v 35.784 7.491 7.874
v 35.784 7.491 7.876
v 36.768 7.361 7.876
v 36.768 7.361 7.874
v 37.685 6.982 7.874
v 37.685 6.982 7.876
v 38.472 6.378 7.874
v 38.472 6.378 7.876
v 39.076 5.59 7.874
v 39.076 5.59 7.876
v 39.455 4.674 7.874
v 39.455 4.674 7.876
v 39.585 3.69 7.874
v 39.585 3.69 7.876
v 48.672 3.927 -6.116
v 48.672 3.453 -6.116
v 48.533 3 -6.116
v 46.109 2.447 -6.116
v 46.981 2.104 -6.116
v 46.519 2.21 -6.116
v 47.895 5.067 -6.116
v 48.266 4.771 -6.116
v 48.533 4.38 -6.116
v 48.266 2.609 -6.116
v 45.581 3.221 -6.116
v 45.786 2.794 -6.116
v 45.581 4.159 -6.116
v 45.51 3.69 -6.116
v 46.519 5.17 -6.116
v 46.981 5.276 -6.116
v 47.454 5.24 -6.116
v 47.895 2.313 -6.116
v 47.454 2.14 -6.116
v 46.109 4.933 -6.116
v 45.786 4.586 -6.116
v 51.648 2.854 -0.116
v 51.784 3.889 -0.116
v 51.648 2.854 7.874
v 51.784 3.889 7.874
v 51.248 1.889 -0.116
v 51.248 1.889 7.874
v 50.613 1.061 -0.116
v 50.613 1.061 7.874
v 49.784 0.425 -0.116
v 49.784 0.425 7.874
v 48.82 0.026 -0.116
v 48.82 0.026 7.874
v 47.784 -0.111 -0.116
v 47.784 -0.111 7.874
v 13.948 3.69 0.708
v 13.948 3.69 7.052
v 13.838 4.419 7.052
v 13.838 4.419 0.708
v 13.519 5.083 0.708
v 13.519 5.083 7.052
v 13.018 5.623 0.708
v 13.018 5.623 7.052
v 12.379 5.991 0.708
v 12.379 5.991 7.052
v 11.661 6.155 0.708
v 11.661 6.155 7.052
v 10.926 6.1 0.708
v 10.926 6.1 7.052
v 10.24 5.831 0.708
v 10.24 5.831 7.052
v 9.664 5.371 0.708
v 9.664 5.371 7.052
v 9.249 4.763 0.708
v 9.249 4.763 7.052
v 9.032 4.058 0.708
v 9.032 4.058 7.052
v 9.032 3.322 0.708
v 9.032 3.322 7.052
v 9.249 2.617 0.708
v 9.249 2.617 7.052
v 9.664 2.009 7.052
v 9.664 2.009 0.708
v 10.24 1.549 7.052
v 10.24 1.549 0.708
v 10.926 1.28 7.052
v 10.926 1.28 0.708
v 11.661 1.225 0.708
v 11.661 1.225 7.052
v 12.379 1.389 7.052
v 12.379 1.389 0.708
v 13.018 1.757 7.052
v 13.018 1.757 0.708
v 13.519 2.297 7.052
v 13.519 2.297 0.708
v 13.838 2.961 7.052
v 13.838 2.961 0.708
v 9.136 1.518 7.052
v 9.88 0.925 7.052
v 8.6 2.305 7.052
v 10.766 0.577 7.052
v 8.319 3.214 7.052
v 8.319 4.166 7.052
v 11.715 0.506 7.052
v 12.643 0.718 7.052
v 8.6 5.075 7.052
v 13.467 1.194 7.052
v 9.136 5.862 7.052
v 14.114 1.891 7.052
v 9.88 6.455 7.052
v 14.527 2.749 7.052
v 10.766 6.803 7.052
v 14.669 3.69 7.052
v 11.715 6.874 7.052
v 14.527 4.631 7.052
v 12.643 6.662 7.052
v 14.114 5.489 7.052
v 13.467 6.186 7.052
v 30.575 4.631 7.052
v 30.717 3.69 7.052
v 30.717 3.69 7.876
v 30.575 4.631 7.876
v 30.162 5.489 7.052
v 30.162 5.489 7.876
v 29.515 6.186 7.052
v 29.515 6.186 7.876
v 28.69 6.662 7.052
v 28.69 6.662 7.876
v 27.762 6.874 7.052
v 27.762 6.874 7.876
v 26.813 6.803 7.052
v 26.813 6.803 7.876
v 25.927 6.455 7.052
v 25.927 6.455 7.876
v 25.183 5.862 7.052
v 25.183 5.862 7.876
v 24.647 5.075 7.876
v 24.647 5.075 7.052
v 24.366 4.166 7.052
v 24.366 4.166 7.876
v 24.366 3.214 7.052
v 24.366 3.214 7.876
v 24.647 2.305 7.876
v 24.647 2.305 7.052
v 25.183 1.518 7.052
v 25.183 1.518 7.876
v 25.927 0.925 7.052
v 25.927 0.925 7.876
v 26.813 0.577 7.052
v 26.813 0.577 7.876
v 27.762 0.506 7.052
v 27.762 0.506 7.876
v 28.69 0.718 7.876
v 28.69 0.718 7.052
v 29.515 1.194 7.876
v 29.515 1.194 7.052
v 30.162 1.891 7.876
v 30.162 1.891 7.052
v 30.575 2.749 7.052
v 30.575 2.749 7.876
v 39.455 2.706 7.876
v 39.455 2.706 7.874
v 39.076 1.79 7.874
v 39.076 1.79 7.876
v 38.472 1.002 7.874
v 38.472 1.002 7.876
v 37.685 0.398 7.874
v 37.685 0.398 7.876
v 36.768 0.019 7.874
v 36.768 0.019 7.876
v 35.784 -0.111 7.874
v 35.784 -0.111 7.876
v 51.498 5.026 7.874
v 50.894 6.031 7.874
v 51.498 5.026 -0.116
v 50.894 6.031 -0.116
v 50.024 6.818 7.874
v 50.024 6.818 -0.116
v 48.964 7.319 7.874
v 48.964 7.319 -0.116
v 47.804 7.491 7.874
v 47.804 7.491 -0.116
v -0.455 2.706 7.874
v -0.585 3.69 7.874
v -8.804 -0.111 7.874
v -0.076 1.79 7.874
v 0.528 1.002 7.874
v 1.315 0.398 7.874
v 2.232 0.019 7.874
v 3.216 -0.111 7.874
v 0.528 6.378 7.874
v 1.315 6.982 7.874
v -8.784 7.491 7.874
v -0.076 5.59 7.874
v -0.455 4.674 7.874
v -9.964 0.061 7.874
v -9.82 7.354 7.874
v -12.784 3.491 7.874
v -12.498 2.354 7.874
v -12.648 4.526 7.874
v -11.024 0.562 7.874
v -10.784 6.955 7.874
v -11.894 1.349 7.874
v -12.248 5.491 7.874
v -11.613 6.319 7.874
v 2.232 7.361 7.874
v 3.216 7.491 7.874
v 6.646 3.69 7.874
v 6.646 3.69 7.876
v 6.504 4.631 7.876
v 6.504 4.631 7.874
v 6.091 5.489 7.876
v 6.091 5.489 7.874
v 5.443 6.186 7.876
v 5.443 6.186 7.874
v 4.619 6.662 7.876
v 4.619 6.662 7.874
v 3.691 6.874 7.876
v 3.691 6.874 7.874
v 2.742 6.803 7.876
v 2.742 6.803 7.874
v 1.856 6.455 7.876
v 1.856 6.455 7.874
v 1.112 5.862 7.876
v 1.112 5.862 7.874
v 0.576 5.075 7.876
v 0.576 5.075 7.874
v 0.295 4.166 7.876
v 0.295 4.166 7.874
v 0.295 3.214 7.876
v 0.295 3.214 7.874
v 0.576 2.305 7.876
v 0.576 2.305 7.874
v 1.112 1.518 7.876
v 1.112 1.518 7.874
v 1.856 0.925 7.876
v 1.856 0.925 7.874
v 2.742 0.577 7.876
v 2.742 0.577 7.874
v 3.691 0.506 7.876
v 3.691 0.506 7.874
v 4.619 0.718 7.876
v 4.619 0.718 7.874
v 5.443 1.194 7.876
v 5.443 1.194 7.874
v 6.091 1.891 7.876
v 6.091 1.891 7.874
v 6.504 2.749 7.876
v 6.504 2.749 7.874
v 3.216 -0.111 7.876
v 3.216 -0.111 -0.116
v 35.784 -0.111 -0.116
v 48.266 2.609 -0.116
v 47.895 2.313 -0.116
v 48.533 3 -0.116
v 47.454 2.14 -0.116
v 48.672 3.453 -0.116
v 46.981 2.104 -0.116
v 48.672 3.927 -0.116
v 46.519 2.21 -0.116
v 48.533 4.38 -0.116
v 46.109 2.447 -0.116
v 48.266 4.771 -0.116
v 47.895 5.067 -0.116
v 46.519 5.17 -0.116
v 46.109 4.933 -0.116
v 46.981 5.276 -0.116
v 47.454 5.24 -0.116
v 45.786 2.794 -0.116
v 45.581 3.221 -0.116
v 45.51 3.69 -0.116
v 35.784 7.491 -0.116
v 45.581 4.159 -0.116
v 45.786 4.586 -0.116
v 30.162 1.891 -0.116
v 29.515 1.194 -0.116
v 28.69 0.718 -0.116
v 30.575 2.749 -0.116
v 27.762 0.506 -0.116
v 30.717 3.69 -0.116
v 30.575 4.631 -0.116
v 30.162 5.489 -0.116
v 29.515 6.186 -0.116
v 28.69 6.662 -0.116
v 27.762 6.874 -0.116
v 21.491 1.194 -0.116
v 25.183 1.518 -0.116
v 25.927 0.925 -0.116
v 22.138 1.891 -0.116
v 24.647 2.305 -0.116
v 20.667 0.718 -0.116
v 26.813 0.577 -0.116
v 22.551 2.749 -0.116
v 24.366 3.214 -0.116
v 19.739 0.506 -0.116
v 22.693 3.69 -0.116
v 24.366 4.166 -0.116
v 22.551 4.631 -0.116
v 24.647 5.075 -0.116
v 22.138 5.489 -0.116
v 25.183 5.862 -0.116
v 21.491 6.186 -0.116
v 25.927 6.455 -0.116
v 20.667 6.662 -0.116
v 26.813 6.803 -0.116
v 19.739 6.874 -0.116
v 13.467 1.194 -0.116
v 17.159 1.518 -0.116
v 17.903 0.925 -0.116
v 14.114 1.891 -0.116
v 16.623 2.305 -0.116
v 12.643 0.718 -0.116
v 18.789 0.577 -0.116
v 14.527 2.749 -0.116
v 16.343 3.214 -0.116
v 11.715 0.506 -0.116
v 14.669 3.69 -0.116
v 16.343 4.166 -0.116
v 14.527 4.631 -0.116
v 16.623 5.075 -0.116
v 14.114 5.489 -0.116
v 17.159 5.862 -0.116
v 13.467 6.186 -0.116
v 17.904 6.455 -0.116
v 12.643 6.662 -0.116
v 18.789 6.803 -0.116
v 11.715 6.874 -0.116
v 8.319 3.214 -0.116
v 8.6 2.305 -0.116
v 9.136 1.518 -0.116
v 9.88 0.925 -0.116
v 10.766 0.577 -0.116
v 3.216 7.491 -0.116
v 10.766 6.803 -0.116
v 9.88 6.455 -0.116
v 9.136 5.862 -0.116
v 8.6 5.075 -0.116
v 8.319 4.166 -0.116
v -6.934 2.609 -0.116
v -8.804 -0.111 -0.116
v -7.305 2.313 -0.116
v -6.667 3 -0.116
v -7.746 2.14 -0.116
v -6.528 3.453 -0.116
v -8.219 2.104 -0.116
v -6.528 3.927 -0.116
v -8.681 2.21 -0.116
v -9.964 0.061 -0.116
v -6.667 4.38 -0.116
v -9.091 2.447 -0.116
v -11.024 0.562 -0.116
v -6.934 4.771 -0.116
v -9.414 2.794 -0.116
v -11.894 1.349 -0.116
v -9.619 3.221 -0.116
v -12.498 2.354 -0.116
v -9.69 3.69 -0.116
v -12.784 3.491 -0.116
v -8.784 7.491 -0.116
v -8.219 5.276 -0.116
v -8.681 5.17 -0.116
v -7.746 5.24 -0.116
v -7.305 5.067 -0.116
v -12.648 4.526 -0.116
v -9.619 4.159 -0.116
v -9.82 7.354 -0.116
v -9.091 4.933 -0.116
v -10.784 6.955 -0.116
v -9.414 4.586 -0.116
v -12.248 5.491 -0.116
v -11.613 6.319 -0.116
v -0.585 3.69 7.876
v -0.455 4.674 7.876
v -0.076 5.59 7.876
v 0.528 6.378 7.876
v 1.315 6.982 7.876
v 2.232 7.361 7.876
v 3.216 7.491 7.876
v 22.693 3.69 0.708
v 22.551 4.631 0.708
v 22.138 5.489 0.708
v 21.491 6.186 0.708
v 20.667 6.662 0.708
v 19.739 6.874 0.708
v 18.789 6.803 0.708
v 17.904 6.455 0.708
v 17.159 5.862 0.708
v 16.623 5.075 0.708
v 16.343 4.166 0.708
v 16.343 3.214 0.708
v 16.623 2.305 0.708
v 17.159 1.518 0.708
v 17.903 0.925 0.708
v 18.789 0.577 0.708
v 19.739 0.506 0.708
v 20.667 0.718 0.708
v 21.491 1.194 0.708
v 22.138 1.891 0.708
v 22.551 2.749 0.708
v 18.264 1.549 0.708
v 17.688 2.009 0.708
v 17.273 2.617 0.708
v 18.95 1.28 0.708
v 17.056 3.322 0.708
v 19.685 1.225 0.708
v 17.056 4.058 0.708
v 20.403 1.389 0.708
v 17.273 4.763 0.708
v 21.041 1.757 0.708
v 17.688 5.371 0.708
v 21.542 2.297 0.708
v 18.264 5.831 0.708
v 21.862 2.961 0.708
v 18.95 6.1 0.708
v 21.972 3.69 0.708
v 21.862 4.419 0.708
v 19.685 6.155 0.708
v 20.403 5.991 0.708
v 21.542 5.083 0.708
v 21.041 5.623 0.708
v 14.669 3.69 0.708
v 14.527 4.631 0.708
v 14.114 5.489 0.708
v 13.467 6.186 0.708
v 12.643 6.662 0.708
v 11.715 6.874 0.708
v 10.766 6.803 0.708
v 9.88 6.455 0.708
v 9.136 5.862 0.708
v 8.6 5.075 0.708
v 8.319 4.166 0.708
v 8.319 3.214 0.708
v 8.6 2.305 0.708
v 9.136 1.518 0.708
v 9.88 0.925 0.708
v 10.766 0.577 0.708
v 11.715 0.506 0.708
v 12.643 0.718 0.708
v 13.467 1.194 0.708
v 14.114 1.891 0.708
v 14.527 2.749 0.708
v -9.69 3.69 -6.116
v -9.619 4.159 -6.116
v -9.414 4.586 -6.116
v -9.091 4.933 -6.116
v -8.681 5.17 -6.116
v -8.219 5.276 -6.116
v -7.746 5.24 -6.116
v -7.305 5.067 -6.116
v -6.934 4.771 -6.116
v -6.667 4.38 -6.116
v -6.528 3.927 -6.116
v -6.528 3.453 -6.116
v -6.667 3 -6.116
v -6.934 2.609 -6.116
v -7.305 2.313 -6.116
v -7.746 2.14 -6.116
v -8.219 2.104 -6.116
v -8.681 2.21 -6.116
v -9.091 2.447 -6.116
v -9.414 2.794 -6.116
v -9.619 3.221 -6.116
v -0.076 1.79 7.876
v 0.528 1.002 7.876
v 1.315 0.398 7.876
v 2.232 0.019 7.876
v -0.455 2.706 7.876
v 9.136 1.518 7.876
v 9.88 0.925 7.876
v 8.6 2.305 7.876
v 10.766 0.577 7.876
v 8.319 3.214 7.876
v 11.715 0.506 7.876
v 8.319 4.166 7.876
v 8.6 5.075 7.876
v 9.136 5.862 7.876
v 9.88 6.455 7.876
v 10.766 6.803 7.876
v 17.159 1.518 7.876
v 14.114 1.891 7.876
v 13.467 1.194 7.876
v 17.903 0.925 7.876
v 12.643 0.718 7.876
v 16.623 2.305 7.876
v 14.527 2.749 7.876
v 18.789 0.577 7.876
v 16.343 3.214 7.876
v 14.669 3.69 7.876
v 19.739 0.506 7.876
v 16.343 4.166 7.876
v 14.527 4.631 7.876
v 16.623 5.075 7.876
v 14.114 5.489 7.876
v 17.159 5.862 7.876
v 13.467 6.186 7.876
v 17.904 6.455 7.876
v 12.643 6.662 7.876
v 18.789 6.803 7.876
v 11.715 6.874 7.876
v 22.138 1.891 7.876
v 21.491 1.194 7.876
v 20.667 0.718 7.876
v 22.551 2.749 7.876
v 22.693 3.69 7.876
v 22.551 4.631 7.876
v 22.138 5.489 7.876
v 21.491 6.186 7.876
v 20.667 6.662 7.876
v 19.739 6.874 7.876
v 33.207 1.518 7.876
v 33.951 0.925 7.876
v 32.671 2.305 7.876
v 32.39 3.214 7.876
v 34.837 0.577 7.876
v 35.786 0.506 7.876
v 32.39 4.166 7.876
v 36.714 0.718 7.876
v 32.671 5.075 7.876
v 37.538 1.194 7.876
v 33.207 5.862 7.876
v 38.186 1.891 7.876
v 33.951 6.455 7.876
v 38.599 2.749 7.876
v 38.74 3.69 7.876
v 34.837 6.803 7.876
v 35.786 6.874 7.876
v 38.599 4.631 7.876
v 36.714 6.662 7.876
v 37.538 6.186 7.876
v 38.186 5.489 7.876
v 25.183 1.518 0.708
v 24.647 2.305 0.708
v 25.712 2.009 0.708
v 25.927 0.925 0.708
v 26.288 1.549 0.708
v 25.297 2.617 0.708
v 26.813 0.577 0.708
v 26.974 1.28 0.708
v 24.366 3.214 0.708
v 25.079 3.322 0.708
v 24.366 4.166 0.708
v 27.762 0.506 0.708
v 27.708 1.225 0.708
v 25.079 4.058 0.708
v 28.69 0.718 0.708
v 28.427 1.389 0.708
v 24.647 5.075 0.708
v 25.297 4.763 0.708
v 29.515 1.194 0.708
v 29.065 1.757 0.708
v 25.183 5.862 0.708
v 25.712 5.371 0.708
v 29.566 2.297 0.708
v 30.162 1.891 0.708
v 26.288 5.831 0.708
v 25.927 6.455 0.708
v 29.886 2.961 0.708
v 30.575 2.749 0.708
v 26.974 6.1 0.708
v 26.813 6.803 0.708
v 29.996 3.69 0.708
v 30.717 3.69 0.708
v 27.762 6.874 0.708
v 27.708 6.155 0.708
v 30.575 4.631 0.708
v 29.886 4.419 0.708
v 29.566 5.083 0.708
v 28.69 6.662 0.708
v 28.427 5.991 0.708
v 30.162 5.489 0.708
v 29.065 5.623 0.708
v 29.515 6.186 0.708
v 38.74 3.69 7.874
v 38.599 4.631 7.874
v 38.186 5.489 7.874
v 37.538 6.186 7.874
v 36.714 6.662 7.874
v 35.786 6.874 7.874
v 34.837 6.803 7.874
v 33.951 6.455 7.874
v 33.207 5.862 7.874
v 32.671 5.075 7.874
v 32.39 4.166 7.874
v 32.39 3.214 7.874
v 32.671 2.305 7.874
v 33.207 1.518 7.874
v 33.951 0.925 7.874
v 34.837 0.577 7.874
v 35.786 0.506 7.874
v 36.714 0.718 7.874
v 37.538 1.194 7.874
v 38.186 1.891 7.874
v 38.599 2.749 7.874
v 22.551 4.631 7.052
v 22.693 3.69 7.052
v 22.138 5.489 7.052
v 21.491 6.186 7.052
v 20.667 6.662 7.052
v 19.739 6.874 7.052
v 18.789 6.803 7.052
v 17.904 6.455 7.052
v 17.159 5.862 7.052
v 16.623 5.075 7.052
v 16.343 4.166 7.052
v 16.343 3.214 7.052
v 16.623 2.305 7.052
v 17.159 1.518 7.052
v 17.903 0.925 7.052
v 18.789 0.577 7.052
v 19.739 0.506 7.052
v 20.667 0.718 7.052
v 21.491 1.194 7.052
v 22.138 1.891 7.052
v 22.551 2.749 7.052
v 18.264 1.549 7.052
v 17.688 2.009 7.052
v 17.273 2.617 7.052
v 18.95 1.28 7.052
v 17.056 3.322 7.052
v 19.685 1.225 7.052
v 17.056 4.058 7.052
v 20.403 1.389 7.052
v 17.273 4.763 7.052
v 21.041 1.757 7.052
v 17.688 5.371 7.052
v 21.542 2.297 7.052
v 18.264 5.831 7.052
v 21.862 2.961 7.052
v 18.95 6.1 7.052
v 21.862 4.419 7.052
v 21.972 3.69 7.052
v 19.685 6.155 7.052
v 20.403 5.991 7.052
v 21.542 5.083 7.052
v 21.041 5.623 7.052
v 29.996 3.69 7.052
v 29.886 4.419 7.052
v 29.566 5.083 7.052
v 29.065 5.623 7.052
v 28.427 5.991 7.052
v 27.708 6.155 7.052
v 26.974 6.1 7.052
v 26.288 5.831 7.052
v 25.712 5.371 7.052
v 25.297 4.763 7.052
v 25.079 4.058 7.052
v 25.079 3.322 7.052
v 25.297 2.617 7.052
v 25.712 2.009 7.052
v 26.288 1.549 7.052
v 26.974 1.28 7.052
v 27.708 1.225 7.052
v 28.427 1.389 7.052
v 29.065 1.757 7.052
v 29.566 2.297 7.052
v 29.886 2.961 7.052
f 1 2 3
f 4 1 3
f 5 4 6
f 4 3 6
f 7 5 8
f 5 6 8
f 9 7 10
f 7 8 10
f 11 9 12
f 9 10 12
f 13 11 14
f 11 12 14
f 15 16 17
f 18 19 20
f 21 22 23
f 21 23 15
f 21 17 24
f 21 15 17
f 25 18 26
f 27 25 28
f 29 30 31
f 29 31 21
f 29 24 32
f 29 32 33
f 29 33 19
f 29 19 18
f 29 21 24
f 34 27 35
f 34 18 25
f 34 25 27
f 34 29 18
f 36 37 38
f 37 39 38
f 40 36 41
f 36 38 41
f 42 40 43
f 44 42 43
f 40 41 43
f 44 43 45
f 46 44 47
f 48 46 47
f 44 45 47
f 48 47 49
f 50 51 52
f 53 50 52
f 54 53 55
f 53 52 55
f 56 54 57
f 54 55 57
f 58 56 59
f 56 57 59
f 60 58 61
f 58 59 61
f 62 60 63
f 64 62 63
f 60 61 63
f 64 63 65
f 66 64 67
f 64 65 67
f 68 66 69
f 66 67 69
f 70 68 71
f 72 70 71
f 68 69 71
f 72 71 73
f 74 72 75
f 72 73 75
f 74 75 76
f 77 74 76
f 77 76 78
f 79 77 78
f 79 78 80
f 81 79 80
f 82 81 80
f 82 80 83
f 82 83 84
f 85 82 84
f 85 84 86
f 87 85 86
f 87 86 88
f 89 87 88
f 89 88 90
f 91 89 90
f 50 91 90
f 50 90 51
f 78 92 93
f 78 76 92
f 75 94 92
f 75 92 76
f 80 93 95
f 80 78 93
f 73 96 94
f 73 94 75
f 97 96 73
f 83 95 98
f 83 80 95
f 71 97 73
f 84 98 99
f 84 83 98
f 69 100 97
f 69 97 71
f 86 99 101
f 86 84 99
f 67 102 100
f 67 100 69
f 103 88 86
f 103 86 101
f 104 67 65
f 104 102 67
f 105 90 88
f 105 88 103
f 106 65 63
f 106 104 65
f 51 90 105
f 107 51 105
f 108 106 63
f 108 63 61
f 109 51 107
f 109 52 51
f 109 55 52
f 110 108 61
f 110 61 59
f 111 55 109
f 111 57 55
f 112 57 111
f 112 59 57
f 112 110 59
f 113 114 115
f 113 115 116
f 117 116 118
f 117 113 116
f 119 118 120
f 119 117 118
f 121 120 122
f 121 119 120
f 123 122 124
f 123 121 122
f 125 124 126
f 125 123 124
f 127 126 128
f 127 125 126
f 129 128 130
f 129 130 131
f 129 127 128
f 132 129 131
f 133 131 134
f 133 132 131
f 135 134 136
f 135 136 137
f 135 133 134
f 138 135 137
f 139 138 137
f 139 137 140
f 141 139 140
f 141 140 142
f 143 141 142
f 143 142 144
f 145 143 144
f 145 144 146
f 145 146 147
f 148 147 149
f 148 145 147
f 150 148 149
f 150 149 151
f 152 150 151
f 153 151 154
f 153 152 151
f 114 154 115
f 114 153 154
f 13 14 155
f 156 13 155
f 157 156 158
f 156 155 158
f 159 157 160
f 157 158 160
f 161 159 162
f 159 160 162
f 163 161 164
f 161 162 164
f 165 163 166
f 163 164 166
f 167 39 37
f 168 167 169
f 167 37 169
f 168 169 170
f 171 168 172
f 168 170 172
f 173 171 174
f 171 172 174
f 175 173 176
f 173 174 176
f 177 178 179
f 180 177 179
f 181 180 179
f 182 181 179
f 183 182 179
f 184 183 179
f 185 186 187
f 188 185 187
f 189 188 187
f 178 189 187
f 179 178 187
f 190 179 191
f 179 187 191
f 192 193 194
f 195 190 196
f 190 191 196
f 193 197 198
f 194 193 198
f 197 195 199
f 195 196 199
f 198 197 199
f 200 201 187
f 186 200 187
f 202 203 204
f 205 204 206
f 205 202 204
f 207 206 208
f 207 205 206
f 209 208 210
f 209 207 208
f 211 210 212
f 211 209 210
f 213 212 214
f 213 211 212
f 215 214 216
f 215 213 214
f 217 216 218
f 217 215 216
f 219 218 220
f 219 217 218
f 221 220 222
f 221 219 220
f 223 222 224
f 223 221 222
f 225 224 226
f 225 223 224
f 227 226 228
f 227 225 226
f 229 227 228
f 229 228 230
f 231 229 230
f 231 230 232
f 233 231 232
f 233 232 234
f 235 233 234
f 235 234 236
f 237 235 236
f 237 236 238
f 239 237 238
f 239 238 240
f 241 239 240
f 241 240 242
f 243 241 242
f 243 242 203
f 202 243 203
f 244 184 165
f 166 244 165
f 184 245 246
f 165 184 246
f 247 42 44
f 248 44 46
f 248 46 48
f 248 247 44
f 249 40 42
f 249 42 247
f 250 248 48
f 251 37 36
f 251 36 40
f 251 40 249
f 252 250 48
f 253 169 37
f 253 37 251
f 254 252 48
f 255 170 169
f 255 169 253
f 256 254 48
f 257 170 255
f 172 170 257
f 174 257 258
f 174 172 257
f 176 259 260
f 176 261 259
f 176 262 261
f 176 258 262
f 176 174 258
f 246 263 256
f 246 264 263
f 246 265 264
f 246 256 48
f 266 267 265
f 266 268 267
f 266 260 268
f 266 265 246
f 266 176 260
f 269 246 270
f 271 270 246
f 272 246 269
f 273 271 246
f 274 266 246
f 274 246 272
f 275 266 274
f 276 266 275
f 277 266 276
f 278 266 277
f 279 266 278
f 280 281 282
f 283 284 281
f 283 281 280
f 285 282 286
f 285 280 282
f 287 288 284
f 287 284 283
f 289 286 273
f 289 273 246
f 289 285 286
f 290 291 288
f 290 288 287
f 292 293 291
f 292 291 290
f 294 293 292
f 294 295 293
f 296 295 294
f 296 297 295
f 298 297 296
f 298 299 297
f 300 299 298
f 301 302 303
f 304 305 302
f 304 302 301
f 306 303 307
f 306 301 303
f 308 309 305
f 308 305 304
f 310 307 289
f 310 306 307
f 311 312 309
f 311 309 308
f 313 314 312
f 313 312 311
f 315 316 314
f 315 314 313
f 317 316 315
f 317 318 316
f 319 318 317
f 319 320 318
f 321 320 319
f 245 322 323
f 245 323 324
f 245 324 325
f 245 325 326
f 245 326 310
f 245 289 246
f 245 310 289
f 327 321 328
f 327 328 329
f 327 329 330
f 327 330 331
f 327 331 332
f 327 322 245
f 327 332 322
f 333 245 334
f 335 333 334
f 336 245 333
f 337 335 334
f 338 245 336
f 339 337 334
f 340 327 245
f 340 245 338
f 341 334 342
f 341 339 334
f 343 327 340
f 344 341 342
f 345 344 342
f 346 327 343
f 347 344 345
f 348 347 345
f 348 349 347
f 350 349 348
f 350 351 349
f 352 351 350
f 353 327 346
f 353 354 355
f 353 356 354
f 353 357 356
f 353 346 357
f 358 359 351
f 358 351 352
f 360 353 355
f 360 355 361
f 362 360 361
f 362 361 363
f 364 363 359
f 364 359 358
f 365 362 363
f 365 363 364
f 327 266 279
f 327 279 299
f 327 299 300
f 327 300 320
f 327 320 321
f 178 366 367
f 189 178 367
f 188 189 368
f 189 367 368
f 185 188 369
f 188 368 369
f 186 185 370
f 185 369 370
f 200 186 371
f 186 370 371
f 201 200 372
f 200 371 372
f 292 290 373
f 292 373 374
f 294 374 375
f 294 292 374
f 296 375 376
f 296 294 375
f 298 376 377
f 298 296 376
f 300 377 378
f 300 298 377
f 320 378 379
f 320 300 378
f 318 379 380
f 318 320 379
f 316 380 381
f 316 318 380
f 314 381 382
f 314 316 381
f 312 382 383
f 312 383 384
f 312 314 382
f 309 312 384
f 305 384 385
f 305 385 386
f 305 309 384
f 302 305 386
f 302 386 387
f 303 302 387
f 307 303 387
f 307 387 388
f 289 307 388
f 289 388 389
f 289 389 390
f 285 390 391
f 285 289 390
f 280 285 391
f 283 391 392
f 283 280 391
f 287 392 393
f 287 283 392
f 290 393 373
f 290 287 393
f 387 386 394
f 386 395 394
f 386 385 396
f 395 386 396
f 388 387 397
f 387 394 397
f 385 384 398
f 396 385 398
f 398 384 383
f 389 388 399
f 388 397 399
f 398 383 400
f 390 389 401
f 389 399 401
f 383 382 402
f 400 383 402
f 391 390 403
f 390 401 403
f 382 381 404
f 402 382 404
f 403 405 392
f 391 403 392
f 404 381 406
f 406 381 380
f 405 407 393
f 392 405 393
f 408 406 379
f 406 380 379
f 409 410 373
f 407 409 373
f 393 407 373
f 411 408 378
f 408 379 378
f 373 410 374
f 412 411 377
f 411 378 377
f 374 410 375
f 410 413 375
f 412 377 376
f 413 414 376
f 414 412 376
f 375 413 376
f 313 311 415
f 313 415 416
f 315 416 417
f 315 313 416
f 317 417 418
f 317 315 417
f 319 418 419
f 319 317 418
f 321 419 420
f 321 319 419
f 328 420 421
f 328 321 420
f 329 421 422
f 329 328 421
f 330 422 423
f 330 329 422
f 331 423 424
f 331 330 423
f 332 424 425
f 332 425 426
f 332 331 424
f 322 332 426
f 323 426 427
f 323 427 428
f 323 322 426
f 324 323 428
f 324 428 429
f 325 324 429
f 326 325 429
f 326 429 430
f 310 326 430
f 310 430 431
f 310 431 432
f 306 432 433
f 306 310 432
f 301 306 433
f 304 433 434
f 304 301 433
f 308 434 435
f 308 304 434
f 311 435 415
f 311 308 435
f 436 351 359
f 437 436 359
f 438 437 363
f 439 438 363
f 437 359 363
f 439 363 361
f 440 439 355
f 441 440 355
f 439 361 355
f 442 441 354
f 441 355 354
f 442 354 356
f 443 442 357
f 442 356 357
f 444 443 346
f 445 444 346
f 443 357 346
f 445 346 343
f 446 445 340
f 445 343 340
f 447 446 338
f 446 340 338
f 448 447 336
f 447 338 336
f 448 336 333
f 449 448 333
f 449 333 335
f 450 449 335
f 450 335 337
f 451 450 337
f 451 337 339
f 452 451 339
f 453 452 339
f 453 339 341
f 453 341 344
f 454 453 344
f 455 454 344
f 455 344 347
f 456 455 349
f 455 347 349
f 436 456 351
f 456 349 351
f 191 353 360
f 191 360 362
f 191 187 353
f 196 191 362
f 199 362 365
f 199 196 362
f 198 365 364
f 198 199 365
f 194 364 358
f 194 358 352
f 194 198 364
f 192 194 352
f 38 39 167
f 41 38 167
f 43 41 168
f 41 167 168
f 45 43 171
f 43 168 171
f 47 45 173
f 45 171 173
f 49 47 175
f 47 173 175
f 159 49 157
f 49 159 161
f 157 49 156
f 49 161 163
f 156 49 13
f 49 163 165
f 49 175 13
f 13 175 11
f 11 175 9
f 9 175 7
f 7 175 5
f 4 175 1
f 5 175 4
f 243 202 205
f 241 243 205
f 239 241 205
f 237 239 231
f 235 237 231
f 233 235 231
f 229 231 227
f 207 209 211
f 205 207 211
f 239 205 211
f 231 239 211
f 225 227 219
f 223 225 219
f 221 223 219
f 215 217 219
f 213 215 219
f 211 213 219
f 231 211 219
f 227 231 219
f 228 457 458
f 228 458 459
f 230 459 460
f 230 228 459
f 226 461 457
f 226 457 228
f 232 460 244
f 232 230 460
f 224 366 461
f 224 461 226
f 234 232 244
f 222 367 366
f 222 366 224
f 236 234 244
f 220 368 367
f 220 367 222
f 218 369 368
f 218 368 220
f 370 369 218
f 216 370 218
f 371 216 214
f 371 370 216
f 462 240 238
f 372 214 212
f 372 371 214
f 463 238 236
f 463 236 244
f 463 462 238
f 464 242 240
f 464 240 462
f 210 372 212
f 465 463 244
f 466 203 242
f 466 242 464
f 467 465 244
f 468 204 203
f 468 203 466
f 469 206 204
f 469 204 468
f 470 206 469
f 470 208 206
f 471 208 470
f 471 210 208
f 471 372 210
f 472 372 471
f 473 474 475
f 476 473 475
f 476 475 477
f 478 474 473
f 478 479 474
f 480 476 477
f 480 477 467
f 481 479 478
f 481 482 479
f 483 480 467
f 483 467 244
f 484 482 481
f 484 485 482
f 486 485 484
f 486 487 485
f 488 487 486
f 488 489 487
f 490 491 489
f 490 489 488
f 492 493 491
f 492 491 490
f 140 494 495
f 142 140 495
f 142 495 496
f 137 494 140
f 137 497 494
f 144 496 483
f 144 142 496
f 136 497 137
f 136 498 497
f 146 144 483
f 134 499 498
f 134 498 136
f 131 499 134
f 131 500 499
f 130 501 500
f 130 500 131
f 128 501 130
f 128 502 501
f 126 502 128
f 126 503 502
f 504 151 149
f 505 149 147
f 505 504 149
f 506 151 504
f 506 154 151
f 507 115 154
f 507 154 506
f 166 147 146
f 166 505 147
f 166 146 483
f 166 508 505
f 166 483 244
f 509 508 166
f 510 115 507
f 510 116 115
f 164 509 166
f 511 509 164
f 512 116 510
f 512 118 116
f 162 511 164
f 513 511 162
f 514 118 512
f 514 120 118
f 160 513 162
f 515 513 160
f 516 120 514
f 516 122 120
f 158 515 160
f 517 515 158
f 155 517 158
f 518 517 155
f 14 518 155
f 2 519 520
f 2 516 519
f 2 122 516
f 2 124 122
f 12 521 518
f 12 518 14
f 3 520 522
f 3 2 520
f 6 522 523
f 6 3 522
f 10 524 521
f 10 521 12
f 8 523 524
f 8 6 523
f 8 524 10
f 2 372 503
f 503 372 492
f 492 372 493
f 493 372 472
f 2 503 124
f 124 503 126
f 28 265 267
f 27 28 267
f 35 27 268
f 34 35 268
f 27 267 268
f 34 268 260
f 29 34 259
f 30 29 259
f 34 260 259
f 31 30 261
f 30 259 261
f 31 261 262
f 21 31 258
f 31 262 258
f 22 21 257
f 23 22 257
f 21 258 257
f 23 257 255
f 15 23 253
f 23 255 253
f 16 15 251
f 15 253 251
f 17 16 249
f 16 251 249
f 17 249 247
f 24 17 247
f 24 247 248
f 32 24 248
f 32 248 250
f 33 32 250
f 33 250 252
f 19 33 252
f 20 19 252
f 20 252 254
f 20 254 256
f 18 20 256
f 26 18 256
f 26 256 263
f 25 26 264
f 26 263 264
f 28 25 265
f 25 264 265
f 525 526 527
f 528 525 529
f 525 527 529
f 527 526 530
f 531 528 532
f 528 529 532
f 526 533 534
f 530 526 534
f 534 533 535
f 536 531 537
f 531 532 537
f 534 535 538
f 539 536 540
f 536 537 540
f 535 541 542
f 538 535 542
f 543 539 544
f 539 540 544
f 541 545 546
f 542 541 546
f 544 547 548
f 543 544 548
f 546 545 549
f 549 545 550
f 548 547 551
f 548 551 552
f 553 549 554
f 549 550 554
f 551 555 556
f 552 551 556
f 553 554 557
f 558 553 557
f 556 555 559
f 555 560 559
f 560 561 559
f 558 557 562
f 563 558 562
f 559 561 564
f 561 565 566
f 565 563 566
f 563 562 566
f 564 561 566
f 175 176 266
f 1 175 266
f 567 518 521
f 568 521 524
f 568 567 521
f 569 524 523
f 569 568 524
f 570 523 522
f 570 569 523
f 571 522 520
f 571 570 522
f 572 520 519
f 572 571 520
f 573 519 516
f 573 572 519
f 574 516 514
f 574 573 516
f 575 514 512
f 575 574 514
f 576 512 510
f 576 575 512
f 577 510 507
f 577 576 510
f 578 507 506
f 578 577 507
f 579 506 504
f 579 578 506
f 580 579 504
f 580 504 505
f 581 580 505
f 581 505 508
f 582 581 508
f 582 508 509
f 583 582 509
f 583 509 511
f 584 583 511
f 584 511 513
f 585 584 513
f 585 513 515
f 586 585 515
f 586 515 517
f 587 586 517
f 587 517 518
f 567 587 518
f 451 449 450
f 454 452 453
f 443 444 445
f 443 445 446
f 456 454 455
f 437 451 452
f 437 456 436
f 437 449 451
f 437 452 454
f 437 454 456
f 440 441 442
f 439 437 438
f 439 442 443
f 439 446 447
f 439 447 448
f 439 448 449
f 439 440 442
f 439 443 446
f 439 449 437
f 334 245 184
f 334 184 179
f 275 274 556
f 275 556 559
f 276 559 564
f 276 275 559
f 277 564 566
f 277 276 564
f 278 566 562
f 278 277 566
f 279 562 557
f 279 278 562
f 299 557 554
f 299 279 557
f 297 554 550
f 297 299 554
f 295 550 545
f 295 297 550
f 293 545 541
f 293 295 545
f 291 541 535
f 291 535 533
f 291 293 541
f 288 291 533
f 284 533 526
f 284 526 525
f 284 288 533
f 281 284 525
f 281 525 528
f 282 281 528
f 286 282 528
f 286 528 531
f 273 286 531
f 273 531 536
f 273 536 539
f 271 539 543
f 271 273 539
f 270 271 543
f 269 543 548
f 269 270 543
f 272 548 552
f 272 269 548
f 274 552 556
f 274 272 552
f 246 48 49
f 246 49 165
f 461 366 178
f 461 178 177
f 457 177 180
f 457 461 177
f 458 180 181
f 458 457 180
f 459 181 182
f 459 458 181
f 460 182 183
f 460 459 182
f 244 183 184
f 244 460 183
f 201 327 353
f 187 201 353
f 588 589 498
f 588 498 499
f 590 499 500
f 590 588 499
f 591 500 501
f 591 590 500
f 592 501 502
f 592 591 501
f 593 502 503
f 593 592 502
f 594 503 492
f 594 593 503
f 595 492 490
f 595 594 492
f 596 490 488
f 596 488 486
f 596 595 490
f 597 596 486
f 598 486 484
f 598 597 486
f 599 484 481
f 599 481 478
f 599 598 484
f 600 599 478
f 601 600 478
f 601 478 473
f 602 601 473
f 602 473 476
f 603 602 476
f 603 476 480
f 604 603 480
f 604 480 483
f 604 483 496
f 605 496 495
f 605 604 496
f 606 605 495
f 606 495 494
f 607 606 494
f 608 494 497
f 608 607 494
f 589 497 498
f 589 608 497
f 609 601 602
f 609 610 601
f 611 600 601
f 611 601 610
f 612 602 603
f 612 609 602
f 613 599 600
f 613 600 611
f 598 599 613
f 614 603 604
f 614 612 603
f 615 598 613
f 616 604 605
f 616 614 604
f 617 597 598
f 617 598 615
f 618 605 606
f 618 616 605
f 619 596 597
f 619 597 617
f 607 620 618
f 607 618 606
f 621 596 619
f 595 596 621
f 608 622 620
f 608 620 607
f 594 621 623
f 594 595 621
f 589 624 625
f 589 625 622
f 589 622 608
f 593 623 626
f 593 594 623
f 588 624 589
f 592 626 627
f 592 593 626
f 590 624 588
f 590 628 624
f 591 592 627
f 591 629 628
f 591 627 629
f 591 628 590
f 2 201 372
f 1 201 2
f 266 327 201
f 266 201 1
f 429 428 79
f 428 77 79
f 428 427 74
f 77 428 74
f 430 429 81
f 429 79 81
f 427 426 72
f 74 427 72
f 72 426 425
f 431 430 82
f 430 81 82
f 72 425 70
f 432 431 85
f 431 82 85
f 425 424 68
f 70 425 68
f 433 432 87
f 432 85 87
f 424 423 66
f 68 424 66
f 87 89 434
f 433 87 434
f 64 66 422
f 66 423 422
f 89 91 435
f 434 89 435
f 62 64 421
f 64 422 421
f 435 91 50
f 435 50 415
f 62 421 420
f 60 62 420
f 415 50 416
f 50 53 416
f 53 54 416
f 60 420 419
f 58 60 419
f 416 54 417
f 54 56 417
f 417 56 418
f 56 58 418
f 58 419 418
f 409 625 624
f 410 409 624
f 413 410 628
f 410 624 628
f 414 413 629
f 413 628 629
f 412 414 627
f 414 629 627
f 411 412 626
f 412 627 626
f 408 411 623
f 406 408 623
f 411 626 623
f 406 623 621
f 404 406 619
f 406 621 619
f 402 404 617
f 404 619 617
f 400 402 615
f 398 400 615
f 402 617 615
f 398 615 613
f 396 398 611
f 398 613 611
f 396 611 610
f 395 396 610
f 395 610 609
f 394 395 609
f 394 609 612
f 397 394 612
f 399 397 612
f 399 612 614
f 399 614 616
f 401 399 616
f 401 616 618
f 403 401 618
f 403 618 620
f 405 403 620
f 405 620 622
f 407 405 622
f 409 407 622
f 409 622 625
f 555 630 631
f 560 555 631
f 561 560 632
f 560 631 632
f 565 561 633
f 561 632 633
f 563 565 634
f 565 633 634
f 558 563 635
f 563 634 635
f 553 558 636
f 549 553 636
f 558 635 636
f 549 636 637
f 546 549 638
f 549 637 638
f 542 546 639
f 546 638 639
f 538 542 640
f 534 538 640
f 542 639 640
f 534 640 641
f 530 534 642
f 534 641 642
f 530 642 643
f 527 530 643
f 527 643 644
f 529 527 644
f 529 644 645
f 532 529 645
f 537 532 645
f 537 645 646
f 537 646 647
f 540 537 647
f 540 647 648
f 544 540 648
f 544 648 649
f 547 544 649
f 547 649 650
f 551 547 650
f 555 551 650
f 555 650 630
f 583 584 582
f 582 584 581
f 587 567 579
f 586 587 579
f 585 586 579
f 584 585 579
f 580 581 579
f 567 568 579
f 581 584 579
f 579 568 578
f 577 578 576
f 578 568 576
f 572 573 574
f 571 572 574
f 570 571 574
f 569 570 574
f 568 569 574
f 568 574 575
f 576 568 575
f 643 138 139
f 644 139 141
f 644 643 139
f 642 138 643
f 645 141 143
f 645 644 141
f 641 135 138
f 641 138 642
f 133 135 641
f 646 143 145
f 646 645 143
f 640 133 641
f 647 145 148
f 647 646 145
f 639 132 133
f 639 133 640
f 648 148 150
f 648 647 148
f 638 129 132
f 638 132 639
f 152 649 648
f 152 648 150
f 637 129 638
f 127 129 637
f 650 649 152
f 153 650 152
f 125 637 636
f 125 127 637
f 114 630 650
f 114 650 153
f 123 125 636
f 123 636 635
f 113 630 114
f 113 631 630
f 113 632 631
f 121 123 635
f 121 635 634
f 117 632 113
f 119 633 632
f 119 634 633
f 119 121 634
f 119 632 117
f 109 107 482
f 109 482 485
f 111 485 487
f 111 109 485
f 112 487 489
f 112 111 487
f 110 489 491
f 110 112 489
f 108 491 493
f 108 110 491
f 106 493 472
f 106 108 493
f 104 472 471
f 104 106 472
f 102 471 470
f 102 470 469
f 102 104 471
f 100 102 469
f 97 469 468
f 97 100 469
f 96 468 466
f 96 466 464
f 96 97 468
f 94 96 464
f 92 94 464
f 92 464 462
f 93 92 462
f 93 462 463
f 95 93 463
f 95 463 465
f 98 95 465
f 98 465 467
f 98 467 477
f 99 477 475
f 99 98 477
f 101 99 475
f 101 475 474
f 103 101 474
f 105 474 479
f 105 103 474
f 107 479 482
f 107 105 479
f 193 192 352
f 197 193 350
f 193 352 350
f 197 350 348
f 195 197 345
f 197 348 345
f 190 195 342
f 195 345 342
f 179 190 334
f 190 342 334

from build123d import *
from build123d.topology import SkipClean

# Parameters (mm, degrees)
SKETCH1_W                = 39
SKETCH1_H                = 7.38
BOSS_EXTRUDE1_DEPTH      = 7.76
SKETCH2_R                = 2.4
CUT_EXTRUDE1_DEPTH       = 7.76
CUT_EXTRUDE2_OUTLINE_R   = 3.1
CUT_EXTRUDE2_OUTLINE_R_2 = 2.4
CUT_EXTRUDE2_DEPTH       = 0.8
CUT_EXTRUDE3_START       = 6.96
CUT_EXTRUDE3_OUTLINE_R   = 3.1
CUT_EXTRUDE3_OUTLINE_R_2 = 2.4
CUT_EXTRUDE3_DEPTH       = 0.8
LPATTERN3_COUNT          = 3
LPATTERN3_PITCH          = 7.79
LPATTERN6_COUNT          = 3
LPATTERN6_PITCH          = 7.79
FILLET1_R                = 3.69
FILLET2_R                = 3.69
FILLET3_R                = 3.69
FILLET4_R                = 3.69
SCALE1_SCALE             = 1.03
SKETCH5_R                = 3.193
BOSS_EXTRUDE2_DEPTH      = 7.99
SKETCH7_W                = 16
SKETCH7_H                = 7.6014
BOSS_EXTRUDE4_DEPTH      = 7.99
SKETCH4_R                = 1.59
BOSS_EXTRUDE5_DEPTH      = 6
FILLET5_R                = 4
FILLET6_R                = 4
FILLET7_R                = 4
FILLET8_R                = 4


with BuildPart() as part:
    # Sketch1 → Boss-Extrude1 (new body)
    with BuildSketch(Plane.XY):
        with Locations((19.5, 3.69)):
            Rectangle(SKETCH1_W, SKETCH1_H)
    extrude(amount=BOSS_EXTRUDE1_DEPTH)

    # Sketch2 → Cut-Extrude1 (cut)
    with BuildSketch(Plane.XY.offset(7.76)):
        with Locations((19.5, 3.69)):
            Circle(SKETCH2_R)
    cut_extrude1 = extrude(amount=-CUT_EXTRUDE1_DEPTH, mode=Mode.SUBTRACT)

    # Cut-Extrude2: read off the stored shape, not the designer's step
    # Cut-Extrude2 outline → Cut-Extrude2 (cut)
    with BuildSketch(Plane.XY):
        with Locations((19.5, 3.69)):
            Circle(CUT_EXTRUDE2_OUTLINE_R)
        with Locations((19.5, 3.69)):
            Circle(CUT_EXTRUDE2_OUTLINE_R_2, mode=Mode.SUBTRACT)
    cut_extrude2 = extrude(amount=CUT_EXTRUDE2_DEPTH, mode=Mode.SUBTRACT)

    # Cut-Extrude3: read off the stored shape, not the designer's step
    # Cut-Extrude3 outline → Cut-Extrude3 (cut)
    with BuildSketch(Plane.XY.offset(CUT_EXTRUDE3_START)):
        with Locations((19.5, 3.69)):
            Circle(CUT_EXTRUDE3_OUTLINE_R)
        with Locations((19.5, 3.69)):
            Circle(CUT_EXTRUDE3_OUTLINE_R_2, mode=Mode.SUBTRACT)
    cut_extrude3 = extrude(amount=CUT_EXTRUDE3_DEPTH, mode=Mode.SUBTRACT)

    # LPattern3: Cut-Extrude1, Cut-Extrude2, Cut-Extrude3 ×3
    with Locations(*[(-i * LPATTERN3_PITCH, 0, 0) for i in range(1, LPATTERN3_COUNT)]):
        add(cut_extrude1, mode=Mode.SUBTRACT)
        add(cut_extrude2, mode=Mode.SUBTRACT)
        add(cut_extrude3, mode=Mode.SUBTRACT)

    # LPattern6: Cut-Extrude1, Cut-Extrude2, Cut-Extrude3 ×3
    with Locations(*[(i * LPATTERN6_PITCH, 0, 0) for i in range(1, LPATTERN6_COUNT)]):
        add(cut_extrude1, mode=Mode.SUBTRACT)
        add(cut_extrude2, mode=Mode.SUBTRACT)
        add(cut_extrude3, mode=Mode.SUBTRACT)

    # Fillet1
    fillet1_edges = [part.edges().sort_by_distance(p)[0] for p in [
        (0, 7.38, 3.88),
    ]]
    fillet(fillet1_edges, radius=FILLET1_R)

    # Fillet2
    fillet2_edges = [part.edges().sort_by_distance(p)[0] for p in [
        (0, 0, 3.88),
    ]]
    fillet(fillet2_edges, radius=FILLET2_R - 0.0001)  # a hair under: the kernel refuses the full size

    # Fillet3
    fillet3_edges = [part.edges().sort_by_distance(p)[0] for p in [
        (39, 7.38, 3.88),
    ]]
    fillet(fillet3_edges, radius=FILLET3_R)

    # Fillet4
    fillet4_edges = [part.edges().sort_by_distance(p)[0] for p in [
        (39, 0, 3.88),
    ]]
    fillet(fillet4_edges, radius=FILLET4_R - 0.0001)  # a hair under: the kernel refuses the full size


with BuildPart() as part_1:
    # Scale1: scaled about (19.5, 3.689995512, 3.88)
    add(part.part.scale(SCALE1_SCALE).moved(Location((-0.585, -0.110699865, -0.1164))))

    # Sketch5 → Boss-Extrude2 (add)
    with BuildSketch(Plane(origin=(0, 0, -0.1164), x_dir=(-1, 0, 0), z_dir=(0, 0, -1))):
        with Locations((-35.5474, 3.69)):
            Circle(SKETCH5_R)
        with Locations((-3.4526, 3.69)):
            Circle(SKETCH5_R)
    extrude(amount=-BOSS_EXTRUDE2_DEPTH)

    # Sketch7 → Boss-Extrude4 (add)
    with SkipClean():  # the faces are left unmerged after this step: merging them gives an invalid solid
        with BuildSketch(Plane(origin=(0, 0, -0.1164), x_dir=(-1, 0, 0), z_dir=(0, 0, -1))):
            with Locations((-43.7843, 3.69)):
                Rectangle(SKETCH7_W, SKETCH7_H)
            with Locations((4.7843, 3.69)):
                Rectangle(SKETCH7_W, SKETCH7_H)
        extrude(amount=-BOSS_EXTRUDE4_DEPTH)

    # Sketch4 → Boss-Extrude5 (add)
    with SkipClean():  # the faces are left unmerged after this step: merging them gives an invalid solid
        with BuildSketch(Plane(origin=(0, 0, -0.1164), x_dir=(-1, 0, 0), z_dir=(0, 0, -1))):
            with Locations((-47.1, 3.69)):
                Circle(SKETCH4_R)
            with Locations((8.1, 3.69)):
                Circle(SKETCH4_R)
        extrude(amount=BOSS_EXTRUDE5_DEPTH)

    # Fillet5
    fillet5_edges = [part_1.edges().sort_by_distance(p)[0] for p in [
        (51.7843, -0.1107, 3.8786),
    ]]
    fillet(fillet5_edges, radius=FILLET5_R)

    # Fillet6
    # the kernel refuses this fillet: 4 mm, written as the material it takes off along each edge
    with BuildSketch(Plane(origin=(51.7843, 7.4907, -10.066625513), x_dir=(0, -1, 0), z_dir=(0, 0, 1))) as fillet6_piece_1:
        with BuildLine():
            CenterArc((4, -3.980090205), FILLET6_R, 95.719016284, 84.280983716)
            Line((0, -3.980090205), (-0.08, -3.980090205))
            Line((-0.08, -3.980090205), (-0.08, 0))
            Line((-0.08, 0), (0, 0.08))
            ThreePointArc((0, 0.08), (1.8007, 0.08), (3.593428, 0.079601804))
            Line((3.593428, 0.079601804), (3.6014, 0))
        make_face()
    extrude(amount=27.890451025, mode=Mode.SUBTRACT)

    # Fillet7
    fillet7_edges = [part_1.edges().sort_by_distance(p)[0] for p in [
        (-12.7843, 7.4907, 3.8786),
    ]]
    fillet(fillet7_edges, radius=FILLET7_R)

    # Fillet8
    # the kernel refuses this fillet: 4 mm, written as the material it takes off along each edge
    with BuildSketch(Plane(origin=(-12.7843, -0.1107, -10.066625513), x_dir=(0, 1, 0), z_dir=(0, 0, 1))) as fillet8_piece_1:
        with BuildLine():
            CenterArc((4, -3.980090205), FILLET8_R, 95.719016284, 84.280983716)
            Line((0, -3.980090205), (-0.08, -3.980090205))
            Line((-0.08, -3.980090205), (-0.08, 0))
            Line((-0.08, 0), (0, 0.08))
            ThreePointArc((0, 0.08), (1.8007, 0.08), (3.593428, 0.079601804))
            Line((3.593428, 0.079601804), (3.6014, 0))
        make_face()
    extrude(amount=27.890451025, mode=Mode.SUBTRACT)


solid = part_1.part
